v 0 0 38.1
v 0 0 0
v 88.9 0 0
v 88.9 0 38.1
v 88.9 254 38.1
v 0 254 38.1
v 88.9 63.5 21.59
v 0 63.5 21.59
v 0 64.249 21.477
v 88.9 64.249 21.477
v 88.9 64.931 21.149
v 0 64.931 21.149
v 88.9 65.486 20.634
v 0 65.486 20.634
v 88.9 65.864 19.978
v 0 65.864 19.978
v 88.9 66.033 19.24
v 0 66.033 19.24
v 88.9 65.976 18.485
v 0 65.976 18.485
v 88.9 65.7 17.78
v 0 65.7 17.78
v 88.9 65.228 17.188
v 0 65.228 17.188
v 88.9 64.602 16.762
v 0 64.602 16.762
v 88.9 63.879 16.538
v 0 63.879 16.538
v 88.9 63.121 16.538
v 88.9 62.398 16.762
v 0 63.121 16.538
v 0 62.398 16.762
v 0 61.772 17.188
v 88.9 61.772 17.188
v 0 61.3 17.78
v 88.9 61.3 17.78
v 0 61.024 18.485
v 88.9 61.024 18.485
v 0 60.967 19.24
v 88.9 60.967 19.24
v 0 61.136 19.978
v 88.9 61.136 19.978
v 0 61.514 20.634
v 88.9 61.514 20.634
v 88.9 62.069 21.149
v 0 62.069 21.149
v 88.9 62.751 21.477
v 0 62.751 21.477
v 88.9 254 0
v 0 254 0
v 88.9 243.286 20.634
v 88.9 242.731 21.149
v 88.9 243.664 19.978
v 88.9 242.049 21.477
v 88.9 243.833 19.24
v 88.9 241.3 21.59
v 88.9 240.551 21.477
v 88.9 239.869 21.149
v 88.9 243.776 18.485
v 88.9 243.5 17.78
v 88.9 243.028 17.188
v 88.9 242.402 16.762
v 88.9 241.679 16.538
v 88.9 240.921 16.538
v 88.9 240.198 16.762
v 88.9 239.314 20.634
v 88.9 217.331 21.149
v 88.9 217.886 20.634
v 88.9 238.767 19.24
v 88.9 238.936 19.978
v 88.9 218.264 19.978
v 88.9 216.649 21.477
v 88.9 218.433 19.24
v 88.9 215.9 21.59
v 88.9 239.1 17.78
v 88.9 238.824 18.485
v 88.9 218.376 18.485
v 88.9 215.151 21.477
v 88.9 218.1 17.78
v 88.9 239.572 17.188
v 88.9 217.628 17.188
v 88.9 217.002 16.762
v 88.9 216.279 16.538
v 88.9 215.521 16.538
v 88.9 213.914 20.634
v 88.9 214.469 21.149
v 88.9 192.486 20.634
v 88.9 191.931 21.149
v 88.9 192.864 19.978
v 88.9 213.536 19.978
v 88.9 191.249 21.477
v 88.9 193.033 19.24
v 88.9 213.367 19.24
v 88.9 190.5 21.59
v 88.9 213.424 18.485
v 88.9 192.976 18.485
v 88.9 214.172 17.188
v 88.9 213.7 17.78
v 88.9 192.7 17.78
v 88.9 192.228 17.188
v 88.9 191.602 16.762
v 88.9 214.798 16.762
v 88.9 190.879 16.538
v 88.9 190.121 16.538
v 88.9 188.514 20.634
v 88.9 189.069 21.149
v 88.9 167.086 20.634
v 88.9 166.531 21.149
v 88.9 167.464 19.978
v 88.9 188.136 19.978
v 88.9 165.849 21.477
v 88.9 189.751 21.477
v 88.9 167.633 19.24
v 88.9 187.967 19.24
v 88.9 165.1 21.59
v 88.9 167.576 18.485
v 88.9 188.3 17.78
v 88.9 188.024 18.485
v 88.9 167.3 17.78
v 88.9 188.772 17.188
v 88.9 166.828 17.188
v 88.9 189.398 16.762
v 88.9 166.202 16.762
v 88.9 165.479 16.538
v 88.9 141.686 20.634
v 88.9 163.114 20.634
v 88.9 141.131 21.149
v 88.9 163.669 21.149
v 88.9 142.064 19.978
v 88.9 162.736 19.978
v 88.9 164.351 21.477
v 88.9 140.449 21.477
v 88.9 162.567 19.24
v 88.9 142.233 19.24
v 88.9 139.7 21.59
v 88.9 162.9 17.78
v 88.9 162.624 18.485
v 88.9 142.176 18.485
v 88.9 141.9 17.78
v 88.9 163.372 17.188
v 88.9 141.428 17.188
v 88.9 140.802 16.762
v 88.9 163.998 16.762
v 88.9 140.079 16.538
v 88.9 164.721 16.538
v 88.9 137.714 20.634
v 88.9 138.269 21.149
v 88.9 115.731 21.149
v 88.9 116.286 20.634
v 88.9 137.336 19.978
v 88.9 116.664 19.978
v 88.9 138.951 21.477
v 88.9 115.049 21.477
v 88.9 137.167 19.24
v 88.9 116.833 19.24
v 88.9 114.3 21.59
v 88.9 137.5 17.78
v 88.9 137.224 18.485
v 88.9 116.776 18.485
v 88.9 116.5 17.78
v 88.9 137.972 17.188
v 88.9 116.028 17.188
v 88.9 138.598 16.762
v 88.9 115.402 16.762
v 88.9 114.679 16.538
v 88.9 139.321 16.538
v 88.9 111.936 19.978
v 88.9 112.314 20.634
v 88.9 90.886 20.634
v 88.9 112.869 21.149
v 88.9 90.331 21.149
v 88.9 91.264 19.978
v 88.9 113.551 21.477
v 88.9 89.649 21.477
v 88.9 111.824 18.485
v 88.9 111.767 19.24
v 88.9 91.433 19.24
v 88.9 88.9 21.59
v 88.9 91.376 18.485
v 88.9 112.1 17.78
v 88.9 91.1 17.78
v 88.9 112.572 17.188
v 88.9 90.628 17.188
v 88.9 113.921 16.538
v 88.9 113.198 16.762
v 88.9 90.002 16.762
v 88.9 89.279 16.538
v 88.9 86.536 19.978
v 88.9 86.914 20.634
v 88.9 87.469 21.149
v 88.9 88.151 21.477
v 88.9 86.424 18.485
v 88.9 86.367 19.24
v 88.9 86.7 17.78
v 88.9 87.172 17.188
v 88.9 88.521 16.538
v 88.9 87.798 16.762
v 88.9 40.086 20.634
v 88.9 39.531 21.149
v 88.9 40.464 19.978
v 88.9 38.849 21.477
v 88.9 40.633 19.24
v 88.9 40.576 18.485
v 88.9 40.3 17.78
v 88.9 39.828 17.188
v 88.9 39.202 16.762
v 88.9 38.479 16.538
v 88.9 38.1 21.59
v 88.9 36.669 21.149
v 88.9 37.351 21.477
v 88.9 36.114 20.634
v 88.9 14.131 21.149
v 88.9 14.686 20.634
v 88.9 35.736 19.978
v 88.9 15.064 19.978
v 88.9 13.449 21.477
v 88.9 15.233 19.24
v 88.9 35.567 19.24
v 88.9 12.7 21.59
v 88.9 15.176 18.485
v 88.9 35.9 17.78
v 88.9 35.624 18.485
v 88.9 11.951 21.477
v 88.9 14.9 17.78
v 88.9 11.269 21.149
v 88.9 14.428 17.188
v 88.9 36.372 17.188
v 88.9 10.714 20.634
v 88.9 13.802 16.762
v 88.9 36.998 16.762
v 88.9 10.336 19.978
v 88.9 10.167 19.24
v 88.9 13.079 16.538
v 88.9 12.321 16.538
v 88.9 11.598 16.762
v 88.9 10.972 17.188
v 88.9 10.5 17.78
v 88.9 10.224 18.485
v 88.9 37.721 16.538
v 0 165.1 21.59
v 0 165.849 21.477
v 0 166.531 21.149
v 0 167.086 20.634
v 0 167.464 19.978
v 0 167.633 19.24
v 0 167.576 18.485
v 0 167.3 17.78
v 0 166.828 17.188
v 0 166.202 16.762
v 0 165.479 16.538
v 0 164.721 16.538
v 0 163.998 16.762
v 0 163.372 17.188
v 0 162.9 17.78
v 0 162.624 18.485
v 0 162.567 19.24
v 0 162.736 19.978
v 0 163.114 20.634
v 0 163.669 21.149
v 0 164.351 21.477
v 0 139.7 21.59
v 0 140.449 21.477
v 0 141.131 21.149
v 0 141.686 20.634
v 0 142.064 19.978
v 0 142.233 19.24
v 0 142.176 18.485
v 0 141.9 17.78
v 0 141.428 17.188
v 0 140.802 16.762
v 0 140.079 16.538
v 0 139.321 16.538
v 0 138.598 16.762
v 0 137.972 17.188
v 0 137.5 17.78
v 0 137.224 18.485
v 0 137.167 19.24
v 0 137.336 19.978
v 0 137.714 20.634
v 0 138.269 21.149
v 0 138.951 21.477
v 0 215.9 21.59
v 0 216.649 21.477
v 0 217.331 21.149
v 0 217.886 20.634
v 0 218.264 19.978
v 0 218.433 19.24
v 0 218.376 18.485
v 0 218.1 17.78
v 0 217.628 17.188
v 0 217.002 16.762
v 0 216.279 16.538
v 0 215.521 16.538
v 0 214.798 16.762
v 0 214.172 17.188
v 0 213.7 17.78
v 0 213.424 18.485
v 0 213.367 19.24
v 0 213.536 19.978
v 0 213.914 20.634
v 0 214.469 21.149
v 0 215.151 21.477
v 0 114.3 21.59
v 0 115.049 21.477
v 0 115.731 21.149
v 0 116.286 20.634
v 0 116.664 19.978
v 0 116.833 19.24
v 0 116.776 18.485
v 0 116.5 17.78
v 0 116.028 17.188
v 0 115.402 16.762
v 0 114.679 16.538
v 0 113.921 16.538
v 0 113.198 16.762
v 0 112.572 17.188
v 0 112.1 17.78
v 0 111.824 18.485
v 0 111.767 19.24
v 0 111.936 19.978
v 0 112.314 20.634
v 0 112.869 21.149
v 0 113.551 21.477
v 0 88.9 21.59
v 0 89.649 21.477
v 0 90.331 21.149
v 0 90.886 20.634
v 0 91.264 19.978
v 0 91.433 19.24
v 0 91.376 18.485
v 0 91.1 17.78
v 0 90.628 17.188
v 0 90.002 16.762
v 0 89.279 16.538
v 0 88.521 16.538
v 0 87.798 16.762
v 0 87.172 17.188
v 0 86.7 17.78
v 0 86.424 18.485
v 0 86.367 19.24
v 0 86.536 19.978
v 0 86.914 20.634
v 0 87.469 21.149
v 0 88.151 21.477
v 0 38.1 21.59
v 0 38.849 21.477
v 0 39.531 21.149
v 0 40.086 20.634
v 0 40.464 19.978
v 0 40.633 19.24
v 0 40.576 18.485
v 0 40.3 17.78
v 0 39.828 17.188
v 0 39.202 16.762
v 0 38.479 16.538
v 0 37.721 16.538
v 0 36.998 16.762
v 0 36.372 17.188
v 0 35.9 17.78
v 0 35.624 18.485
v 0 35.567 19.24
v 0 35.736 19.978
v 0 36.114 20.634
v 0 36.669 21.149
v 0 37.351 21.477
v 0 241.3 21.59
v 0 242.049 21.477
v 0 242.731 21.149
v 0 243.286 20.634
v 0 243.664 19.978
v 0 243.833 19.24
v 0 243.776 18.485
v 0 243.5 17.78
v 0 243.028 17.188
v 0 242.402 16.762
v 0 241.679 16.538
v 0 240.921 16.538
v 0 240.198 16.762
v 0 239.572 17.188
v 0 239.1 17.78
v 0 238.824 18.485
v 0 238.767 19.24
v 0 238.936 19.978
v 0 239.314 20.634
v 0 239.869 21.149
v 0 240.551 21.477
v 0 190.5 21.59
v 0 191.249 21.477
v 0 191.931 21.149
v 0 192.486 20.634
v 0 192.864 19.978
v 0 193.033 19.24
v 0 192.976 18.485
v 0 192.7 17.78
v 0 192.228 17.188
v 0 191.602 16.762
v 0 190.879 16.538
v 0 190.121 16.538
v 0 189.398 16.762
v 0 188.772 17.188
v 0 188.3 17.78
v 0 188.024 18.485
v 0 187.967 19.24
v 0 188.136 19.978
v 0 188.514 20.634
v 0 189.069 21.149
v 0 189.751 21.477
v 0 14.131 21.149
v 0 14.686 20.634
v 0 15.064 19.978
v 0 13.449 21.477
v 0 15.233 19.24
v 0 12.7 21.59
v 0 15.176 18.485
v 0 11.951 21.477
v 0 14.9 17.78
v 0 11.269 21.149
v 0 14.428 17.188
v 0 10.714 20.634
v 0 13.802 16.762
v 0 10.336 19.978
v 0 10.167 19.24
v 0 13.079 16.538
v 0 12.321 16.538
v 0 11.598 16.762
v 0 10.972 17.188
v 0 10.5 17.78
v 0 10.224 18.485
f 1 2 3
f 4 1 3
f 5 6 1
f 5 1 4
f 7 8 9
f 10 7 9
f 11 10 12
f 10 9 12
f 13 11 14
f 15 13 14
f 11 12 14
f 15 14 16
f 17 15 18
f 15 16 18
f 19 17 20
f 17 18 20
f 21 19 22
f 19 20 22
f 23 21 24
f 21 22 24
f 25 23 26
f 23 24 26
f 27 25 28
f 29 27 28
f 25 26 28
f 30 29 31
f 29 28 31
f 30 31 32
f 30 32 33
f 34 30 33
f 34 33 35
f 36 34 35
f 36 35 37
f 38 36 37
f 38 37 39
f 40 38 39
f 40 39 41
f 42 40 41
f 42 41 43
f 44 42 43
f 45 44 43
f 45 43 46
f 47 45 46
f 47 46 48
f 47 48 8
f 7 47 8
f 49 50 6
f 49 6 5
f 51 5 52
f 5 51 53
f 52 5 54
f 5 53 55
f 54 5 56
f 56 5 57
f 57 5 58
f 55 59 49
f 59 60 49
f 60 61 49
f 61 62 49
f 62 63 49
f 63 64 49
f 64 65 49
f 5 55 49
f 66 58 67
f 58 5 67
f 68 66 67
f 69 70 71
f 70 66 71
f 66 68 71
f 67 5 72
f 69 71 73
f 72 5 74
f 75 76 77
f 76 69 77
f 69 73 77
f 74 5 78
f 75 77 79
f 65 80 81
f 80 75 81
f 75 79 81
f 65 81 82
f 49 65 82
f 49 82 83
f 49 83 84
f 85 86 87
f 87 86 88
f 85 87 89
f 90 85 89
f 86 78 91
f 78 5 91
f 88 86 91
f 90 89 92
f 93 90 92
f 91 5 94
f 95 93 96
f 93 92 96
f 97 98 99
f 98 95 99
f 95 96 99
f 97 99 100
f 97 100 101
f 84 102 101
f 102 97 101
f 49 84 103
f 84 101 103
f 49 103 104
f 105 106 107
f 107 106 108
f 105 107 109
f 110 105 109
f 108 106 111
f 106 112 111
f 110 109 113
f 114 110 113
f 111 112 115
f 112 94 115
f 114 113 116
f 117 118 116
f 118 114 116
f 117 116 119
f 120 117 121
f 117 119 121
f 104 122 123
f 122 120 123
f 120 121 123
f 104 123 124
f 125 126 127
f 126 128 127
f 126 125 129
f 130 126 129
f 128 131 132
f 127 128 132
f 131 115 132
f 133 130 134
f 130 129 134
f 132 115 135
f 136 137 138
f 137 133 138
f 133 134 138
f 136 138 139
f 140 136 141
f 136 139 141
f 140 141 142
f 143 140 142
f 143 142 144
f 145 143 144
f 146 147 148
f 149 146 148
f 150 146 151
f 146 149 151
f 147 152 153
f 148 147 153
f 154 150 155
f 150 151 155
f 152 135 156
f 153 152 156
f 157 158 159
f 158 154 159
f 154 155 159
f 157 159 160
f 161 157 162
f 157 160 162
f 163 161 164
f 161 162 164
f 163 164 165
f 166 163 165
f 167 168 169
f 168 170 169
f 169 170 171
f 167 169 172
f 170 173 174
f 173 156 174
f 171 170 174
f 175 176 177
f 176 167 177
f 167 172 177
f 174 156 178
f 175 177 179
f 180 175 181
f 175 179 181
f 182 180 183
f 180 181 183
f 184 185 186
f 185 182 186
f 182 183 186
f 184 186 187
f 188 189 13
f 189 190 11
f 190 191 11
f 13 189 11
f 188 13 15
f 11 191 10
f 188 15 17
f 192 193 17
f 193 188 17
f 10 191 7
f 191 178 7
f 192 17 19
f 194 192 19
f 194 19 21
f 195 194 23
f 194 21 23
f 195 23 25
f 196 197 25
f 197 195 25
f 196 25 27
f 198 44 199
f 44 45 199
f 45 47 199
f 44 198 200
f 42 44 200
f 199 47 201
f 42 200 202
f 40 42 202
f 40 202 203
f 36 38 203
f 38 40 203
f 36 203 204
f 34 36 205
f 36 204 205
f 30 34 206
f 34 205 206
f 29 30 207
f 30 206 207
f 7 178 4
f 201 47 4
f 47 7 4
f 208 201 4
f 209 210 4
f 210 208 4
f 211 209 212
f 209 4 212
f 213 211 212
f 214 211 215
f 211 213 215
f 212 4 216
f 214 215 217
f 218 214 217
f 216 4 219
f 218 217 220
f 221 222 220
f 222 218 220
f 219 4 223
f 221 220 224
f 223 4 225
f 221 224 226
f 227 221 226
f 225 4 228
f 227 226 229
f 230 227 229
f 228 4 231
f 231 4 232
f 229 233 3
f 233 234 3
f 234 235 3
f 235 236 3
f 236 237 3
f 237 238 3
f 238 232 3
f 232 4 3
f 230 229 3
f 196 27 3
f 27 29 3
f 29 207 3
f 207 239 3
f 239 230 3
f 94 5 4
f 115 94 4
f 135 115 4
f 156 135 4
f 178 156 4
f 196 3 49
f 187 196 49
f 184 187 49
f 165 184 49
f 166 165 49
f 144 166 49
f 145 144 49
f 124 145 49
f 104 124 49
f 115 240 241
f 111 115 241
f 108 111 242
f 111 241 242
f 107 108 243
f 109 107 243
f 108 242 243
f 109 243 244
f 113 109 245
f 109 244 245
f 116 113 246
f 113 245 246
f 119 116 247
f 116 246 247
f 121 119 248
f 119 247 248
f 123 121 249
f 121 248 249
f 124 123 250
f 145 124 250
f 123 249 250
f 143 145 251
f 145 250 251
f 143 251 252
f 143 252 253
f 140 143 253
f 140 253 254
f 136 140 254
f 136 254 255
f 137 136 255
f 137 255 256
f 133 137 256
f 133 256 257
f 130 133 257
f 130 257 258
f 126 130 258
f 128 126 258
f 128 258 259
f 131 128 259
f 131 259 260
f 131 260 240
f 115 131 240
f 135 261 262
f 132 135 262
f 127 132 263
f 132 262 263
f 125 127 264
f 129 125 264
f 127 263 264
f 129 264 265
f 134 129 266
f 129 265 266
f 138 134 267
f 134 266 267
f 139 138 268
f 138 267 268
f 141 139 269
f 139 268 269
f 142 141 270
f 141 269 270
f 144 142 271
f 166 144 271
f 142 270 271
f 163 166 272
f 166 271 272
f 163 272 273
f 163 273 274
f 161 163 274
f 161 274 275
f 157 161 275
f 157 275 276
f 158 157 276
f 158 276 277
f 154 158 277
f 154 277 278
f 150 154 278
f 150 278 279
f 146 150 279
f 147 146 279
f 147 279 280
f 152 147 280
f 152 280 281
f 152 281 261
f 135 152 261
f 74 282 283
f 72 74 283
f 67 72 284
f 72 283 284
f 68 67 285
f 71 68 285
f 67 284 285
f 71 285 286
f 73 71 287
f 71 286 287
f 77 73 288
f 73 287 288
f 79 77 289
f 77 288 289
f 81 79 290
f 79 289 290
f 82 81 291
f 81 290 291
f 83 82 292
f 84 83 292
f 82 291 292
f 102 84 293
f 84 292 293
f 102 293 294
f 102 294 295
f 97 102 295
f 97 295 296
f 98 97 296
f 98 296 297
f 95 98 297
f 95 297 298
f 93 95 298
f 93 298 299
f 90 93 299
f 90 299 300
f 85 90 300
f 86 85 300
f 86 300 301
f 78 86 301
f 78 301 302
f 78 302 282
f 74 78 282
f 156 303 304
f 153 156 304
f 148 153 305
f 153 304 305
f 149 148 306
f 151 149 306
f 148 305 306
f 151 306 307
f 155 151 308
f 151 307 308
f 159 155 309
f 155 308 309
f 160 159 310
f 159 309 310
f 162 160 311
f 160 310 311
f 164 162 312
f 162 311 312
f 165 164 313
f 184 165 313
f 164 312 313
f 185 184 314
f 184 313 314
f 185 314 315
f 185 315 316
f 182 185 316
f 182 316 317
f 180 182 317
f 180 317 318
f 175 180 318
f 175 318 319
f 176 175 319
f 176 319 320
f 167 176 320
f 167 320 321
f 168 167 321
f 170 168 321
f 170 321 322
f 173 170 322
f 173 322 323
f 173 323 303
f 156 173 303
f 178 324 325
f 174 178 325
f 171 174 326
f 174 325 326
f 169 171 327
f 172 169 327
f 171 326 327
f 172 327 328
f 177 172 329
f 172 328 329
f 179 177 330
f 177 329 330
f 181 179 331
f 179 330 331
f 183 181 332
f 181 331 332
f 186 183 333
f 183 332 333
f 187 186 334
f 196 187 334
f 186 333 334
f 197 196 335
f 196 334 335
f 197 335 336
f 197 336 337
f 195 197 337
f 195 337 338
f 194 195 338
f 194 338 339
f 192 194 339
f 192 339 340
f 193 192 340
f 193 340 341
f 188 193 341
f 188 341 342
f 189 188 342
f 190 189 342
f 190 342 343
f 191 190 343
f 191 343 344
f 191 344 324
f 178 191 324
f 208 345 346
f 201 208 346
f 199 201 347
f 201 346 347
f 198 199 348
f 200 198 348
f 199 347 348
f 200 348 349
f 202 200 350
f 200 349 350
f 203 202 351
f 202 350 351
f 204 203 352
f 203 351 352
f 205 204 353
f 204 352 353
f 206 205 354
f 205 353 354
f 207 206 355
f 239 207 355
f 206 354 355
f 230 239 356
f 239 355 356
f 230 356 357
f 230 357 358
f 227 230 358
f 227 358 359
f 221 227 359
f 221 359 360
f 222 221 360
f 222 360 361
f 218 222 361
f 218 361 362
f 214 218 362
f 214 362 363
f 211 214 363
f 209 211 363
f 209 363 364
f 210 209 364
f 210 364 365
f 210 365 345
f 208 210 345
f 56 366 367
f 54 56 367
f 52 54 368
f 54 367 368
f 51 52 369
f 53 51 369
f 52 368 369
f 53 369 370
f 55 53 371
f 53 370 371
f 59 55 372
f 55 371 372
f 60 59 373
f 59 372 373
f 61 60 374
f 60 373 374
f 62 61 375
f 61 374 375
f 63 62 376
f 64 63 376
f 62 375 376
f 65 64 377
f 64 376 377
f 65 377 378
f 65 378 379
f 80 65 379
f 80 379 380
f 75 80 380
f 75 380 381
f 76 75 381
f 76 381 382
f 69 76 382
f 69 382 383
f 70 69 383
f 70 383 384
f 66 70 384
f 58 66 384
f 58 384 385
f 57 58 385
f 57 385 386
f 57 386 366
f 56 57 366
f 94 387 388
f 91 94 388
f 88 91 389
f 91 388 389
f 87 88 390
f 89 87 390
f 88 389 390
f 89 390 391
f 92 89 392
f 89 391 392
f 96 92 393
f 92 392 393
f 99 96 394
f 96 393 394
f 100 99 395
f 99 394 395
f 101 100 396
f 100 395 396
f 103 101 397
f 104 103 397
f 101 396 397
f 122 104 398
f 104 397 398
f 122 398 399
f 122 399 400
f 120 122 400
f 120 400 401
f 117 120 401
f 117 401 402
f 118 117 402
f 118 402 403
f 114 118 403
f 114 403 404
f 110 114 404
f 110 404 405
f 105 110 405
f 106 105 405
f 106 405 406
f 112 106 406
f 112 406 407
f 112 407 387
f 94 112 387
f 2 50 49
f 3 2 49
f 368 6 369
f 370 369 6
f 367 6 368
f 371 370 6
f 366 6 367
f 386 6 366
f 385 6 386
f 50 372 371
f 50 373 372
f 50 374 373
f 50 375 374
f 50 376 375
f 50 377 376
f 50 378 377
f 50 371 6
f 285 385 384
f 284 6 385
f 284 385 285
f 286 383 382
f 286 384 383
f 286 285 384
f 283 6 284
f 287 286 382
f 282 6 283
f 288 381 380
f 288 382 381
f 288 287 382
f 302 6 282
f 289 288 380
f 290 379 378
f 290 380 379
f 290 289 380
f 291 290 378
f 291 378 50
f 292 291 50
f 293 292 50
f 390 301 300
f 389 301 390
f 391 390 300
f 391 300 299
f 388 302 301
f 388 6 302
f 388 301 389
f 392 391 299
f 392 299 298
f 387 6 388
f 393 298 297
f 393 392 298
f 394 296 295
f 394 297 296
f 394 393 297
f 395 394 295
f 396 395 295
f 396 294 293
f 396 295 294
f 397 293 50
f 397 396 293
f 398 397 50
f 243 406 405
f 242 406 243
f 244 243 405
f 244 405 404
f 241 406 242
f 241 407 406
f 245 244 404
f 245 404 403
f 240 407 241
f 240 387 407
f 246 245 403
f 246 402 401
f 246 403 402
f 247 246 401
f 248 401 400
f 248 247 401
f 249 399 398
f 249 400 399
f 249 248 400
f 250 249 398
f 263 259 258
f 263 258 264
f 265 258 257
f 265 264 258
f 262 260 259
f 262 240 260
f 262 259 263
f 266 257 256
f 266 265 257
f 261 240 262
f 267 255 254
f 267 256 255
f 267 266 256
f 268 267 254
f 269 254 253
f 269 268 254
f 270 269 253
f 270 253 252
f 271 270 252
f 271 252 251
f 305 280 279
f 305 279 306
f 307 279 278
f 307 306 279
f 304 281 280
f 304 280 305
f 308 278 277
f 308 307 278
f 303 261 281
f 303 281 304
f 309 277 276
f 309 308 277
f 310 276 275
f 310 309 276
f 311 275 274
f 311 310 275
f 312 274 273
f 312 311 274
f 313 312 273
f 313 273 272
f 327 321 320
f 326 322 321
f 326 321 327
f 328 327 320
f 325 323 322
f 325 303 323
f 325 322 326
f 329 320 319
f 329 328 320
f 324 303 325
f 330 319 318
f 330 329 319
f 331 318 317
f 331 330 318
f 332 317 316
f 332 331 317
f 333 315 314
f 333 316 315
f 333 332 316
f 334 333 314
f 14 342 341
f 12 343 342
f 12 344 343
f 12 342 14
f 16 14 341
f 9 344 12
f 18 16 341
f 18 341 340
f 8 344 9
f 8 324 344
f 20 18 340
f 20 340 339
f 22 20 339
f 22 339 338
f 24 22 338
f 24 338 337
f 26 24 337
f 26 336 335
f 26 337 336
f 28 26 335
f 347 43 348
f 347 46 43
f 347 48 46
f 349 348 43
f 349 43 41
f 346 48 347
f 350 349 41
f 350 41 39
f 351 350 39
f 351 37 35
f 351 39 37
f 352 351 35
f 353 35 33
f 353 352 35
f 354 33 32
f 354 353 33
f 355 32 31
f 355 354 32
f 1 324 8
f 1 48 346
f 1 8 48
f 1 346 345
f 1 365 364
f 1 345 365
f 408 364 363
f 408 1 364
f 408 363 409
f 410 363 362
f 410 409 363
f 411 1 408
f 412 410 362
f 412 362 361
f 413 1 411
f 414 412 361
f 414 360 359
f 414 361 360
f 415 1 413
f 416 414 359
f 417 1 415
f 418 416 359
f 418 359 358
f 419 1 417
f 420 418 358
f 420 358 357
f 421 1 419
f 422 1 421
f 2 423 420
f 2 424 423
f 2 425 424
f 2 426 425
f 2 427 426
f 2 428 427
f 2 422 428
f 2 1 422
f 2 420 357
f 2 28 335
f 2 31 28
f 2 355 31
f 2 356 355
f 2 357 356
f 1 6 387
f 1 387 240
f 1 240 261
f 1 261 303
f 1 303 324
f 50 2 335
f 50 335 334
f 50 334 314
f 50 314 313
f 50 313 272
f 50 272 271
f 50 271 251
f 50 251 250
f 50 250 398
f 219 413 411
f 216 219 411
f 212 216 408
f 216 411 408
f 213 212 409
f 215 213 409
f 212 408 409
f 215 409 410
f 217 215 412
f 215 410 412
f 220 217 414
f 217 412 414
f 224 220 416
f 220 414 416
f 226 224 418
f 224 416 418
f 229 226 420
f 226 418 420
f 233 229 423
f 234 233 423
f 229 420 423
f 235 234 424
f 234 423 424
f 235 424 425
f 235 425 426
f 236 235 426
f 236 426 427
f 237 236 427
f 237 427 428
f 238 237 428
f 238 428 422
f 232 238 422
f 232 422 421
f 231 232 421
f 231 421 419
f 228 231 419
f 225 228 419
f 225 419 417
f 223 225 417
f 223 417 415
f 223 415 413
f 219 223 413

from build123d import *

# Parameters (mm, degrees)
SKETCH1_W           = 88.9
SKETCH1_H           = 38.1
BOSS_EXTRUDE1_DEPTH = 254
SKETCH2_R           = 2.54
CUT_EXTRUDE1_DEPTH  = 272.7918689


with BuildPart() as part:
    # Sketch1 → Boss-Extrude1 (new body)
    with BuildSketch(Plane(origin=(0, 0, 0), x_dir=(1, 0, 0), z_dir=(0, 1, 0))):
        with Locations((44.45, -19.05)):
            Rectangle(SKETCH1_W, SKETCH1_H)
    extrude(amount=BOSS_EXTRUDE1_DEPTH)

    # Sketch2 → Cut-Extrude1 (cut, through all)
    with BuildSketch(Plane.ZY):
        with Locations((19.05, 12.7)):
            Circle(SKETCH2_R)
        with Locations((19.05, 38.1)):
            Circle(SKETCH2_R)
        with Locations((19.05, 63.5)):
            Circle(SKETCH2_R)
        with Locations((19.05, 88.9)):
            Circle(SKETCH2_R)
        with Locations((19.05, 114.3)):
            Circle(SKETCH2_R)
        with Locations((19.05, 139.7)):
            Circle(SKETCH2_R)
        with Locations((19.05, 165.1)):
            Circle(SKETCH2_R)
        with Locations((19.05, 190.5)):
            Circle(SKETCH2_R)
        with Locations((19.05, 215.9)):
            Circle(SKETCH2_R)
        with Locations((19.05, 241.3)):
            Circle(SKETCH2_R)
    extrude(amount=-CUT_EXTRUDE1_DEPTH, mode=Mode.SUBTRACT)


solid = part.part
